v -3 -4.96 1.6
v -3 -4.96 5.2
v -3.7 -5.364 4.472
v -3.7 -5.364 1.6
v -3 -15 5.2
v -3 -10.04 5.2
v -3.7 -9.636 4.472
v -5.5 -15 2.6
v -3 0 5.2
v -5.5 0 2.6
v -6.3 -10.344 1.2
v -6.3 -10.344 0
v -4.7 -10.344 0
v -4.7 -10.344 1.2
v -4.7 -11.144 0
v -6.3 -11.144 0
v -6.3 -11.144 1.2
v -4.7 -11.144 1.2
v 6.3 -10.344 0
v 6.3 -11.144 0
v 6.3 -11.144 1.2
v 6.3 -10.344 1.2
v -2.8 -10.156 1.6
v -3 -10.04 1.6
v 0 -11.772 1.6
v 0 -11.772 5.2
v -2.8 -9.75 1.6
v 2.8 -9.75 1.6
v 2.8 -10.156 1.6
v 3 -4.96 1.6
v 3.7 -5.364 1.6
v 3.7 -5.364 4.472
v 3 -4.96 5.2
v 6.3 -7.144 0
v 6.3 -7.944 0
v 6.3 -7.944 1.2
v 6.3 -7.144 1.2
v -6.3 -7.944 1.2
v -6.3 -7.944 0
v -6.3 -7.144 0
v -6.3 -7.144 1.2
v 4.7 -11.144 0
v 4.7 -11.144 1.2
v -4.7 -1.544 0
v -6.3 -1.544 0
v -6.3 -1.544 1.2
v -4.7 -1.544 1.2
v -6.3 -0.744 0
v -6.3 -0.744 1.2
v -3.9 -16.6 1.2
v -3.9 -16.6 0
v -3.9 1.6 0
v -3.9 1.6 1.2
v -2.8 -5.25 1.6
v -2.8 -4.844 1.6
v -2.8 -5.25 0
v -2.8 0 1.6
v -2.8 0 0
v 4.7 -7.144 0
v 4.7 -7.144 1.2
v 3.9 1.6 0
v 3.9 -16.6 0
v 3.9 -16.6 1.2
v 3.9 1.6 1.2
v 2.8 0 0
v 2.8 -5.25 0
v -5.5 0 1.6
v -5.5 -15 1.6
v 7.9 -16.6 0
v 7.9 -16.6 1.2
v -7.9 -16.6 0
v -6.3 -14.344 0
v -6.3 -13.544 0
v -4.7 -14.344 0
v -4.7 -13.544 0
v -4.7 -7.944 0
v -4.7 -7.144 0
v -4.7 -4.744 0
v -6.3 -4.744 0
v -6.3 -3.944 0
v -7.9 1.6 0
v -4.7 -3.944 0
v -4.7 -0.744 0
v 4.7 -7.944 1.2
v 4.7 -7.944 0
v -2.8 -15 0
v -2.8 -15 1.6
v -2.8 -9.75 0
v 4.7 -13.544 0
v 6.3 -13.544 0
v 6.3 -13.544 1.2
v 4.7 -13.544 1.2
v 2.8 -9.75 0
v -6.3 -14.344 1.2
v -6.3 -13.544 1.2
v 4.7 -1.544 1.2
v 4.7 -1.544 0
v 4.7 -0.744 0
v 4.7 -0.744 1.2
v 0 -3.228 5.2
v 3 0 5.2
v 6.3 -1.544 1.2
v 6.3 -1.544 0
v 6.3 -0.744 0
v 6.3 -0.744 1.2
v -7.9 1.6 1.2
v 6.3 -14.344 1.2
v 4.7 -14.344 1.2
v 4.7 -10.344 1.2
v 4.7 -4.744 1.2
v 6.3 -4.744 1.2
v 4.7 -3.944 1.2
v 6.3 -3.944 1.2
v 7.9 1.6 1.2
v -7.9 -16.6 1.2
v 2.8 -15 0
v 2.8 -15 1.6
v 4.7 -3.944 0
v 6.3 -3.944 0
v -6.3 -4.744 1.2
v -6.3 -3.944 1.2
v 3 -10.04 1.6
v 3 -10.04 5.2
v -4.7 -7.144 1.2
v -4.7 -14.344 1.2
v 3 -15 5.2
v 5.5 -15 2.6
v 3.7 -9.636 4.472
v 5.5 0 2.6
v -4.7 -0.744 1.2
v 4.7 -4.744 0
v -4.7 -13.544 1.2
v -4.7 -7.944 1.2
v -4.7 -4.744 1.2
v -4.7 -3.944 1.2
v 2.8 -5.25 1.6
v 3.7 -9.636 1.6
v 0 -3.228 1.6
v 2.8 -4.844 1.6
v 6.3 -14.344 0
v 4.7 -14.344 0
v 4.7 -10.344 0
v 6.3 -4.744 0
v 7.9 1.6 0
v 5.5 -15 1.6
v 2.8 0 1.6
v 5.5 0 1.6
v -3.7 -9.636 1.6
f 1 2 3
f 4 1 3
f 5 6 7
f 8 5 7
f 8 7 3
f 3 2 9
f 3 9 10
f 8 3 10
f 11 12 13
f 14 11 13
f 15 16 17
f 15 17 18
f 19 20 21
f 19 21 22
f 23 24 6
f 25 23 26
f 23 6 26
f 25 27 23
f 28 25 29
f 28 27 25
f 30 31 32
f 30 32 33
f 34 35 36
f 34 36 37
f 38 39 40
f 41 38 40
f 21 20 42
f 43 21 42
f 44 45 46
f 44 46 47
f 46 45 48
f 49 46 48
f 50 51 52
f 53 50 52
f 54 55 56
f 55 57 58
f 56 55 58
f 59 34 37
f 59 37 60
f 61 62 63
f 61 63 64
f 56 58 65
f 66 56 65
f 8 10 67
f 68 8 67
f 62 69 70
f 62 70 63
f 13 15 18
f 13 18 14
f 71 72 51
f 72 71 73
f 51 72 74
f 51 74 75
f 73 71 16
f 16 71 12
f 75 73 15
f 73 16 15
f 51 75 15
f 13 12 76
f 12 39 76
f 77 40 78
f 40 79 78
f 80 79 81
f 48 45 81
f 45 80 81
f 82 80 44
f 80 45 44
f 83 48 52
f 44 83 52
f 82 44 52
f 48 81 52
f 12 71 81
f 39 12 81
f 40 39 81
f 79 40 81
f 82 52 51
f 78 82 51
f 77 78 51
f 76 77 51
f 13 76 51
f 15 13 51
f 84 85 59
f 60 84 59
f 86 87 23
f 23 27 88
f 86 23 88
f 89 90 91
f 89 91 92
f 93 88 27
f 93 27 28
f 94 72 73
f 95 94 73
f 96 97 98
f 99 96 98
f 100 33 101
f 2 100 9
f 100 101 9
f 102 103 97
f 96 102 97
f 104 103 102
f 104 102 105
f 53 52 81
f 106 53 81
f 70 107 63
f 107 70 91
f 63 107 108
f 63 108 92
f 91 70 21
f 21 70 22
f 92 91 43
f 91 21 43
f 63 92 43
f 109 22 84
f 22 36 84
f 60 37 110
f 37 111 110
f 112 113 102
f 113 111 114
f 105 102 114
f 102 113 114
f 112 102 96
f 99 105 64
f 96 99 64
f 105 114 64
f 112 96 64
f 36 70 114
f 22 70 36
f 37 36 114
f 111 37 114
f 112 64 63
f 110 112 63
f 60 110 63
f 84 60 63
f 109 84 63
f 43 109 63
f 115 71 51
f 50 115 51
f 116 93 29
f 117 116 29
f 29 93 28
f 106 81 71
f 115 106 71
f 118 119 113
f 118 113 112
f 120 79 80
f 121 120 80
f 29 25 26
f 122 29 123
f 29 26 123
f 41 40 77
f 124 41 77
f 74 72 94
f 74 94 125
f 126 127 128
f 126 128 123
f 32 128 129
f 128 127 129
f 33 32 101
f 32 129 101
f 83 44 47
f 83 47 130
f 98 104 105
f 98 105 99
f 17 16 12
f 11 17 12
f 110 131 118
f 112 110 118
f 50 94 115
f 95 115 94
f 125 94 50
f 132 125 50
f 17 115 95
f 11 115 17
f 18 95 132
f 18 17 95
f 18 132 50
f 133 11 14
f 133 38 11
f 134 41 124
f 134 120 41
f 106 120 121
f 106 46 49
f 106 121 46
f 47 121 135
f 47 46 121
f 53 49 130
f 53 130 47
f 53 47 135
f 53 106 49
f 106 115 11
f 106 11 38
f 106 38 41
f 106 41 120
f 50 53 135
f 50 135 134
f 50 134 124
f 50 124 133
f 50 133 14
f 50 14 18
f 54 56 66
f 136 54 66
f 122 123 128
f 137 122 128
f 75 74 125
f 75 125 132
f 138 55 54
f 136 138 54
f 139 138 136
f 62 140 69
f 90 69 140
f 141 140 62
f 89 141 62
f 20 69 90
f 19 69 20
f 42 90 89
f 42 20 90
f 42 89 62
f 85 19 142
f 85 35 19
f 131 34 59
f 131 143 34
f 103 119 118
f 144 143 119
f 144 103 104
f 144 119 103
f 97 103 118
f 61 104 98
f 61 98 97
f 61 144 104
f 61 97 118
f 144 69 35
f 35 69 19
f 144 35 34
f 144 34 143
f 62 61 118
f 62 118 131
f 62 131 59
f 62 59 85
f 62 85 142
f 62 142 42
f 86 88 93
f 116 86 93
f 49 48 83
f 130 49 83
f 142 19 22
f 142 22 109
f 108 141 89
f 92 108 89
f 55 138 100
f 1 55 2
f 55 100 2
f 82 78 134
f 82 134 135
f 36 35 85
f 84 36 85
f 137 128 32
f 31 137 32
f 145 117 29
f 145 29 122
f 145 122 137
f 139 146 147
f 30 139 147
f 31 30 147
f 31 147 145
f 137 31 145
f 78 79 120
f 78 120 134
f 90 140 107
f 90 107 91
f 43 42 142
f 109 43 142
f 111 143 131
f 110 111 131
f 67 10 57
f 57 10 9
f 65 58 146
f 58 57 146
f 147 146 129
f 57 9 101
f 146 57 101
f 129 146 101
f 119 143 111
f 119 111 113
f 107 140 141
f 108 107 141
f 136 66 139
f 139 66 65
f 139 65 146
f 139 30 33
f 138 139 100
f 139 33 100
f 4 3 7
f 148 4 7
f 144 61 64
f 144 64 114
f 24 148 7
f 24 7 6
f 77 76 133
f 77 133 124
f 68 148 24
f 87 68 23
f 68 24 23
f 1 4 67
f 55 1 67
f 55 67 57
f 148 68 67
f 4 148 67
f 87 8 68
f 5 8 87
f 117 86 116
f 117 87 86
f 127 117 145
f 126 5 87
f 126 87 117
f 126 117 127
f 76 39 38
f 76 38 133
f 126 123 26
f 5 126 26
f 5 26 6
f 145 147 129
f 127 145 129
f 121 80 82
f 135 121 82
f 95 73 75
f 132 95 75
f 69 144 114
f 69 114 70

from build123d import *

# Parameters (mm, degrees)
F1_DEPTH = 15
F3_DEPTH = 3.6
F4_W     = 1.6
F4_H     = 0.8
F5_DEPTH = 1.2
F4_W_2   = 5.6
F4_H_2   = 4.5
F6_DEPTH = 1.6


# Not quite as in the source:
# - a feature names something its author has since deleted; it is built from what else it names


with BuildPart() as f1:
    # F0 (on Front) → F1 (new body)
    with BuildSketch(Plane.XZ):
        Polygon((-2.8, 0), (0, 0), (2.8, 0), (2.8, 1.6), (5.5, 1.6), (5.5, 2.6), (3, 5.2), (0, 5.2), (-3, 5.2), (-5.5, 2.6), (-5.5, 1.6), (-2.8, 1.6), align=None)
    extrude(amount=F1_DEPTH)

    # F2 (on face) → F3 (cut, through all)
    with BuildSketch(Plane.XY.offset(5.2)):
        Polygon((3, -4.9596588156), (0, -3.227608008), (-3, -4.9596588156), (-3, -10.0403411844), (0, -11.772391992), (3, -10.0403411844), align=None)
        Polygon((3.7, -5.363804004), (3, -4.9596588156), (3, -10.0403411844), (3.7, -9.636195996), align=None)
        Polygon((-3, -10.0403411844), (-3, -4.9596588156), (-3.7, -5.363804004), (-3.7, -9.636195996), align=None)
    extrude(amount=-F3_DEPTH, mode=Mode.SUBTRACT)

    # F4 (on Top) → F6 (cut, through all)
    with BuildSketch(Plane.XY):
        with Locations((0, -7.5)):
            Rectangle(F4_W_2, F4_H_2)
    extrude(amount=F6_DEPTH, mode=Mode.SUBTRACT)


with BuildPart() as f5:
    # F4 (on Top) → F5 (new body)
    with BuildSketch(Plane.XY):
        Polygon((-3.9, -0.743646355), (-3.9, 1.6), (-7.9, 1.6), (-7.9, -16.6), (-3.9, -16.6), (-3.9, -14.343646355), (-3.9, -13.543646355), (-3.9, -12.743646355), (-3.9, -11.943646355), (-3.9, -11.143646355), (-3.9, -10.343646355), (-3.9, -9.543646355), (-3.9, -8.743646355), (-3.9, -7.943646355), (-3.9, -7.143646355), (-3.9, -6.343646355), (-3.9, -5.543646355), (-3.9, -4.743646355), (-3.9, -3.943646355), (-3.9, -3.143646355), (-3.9, -2.343646355), (-3.9, -1.543646355), align=None)
        with Locations((-5.5, -13.943646355)):
            Rectangle(F4_W, F4_H, mode=Mode.SUBTRACT)
        with Locations((-5.5, -10.743646355)):
            Rectangle(F4_W, F4_H, mode=Mode.SUBTRACT)
        with Locations((-5.5, -7.543646355)):
            Rectangle(F4_W, F4_H, mode=Mode.SUBTRACT)
        with Locations((-5.5, -4.343646355)):
            Rectangle(F4_W, F4_H, mode=Mode.SUBTRACT)
        with Locations((-5.5, -1.143646355)):
            Rectangle(F4_W, F4_H, mode=Mode.SUBTRACT)
    extrude(amount=F5_DEPTH)


with BuildPart() as f7_1:
    # F7: instance of F5
    add(f5.part.mirror(Plane.YZ))


solid = Compound([f1.part, f5.part, f7_1.part])
